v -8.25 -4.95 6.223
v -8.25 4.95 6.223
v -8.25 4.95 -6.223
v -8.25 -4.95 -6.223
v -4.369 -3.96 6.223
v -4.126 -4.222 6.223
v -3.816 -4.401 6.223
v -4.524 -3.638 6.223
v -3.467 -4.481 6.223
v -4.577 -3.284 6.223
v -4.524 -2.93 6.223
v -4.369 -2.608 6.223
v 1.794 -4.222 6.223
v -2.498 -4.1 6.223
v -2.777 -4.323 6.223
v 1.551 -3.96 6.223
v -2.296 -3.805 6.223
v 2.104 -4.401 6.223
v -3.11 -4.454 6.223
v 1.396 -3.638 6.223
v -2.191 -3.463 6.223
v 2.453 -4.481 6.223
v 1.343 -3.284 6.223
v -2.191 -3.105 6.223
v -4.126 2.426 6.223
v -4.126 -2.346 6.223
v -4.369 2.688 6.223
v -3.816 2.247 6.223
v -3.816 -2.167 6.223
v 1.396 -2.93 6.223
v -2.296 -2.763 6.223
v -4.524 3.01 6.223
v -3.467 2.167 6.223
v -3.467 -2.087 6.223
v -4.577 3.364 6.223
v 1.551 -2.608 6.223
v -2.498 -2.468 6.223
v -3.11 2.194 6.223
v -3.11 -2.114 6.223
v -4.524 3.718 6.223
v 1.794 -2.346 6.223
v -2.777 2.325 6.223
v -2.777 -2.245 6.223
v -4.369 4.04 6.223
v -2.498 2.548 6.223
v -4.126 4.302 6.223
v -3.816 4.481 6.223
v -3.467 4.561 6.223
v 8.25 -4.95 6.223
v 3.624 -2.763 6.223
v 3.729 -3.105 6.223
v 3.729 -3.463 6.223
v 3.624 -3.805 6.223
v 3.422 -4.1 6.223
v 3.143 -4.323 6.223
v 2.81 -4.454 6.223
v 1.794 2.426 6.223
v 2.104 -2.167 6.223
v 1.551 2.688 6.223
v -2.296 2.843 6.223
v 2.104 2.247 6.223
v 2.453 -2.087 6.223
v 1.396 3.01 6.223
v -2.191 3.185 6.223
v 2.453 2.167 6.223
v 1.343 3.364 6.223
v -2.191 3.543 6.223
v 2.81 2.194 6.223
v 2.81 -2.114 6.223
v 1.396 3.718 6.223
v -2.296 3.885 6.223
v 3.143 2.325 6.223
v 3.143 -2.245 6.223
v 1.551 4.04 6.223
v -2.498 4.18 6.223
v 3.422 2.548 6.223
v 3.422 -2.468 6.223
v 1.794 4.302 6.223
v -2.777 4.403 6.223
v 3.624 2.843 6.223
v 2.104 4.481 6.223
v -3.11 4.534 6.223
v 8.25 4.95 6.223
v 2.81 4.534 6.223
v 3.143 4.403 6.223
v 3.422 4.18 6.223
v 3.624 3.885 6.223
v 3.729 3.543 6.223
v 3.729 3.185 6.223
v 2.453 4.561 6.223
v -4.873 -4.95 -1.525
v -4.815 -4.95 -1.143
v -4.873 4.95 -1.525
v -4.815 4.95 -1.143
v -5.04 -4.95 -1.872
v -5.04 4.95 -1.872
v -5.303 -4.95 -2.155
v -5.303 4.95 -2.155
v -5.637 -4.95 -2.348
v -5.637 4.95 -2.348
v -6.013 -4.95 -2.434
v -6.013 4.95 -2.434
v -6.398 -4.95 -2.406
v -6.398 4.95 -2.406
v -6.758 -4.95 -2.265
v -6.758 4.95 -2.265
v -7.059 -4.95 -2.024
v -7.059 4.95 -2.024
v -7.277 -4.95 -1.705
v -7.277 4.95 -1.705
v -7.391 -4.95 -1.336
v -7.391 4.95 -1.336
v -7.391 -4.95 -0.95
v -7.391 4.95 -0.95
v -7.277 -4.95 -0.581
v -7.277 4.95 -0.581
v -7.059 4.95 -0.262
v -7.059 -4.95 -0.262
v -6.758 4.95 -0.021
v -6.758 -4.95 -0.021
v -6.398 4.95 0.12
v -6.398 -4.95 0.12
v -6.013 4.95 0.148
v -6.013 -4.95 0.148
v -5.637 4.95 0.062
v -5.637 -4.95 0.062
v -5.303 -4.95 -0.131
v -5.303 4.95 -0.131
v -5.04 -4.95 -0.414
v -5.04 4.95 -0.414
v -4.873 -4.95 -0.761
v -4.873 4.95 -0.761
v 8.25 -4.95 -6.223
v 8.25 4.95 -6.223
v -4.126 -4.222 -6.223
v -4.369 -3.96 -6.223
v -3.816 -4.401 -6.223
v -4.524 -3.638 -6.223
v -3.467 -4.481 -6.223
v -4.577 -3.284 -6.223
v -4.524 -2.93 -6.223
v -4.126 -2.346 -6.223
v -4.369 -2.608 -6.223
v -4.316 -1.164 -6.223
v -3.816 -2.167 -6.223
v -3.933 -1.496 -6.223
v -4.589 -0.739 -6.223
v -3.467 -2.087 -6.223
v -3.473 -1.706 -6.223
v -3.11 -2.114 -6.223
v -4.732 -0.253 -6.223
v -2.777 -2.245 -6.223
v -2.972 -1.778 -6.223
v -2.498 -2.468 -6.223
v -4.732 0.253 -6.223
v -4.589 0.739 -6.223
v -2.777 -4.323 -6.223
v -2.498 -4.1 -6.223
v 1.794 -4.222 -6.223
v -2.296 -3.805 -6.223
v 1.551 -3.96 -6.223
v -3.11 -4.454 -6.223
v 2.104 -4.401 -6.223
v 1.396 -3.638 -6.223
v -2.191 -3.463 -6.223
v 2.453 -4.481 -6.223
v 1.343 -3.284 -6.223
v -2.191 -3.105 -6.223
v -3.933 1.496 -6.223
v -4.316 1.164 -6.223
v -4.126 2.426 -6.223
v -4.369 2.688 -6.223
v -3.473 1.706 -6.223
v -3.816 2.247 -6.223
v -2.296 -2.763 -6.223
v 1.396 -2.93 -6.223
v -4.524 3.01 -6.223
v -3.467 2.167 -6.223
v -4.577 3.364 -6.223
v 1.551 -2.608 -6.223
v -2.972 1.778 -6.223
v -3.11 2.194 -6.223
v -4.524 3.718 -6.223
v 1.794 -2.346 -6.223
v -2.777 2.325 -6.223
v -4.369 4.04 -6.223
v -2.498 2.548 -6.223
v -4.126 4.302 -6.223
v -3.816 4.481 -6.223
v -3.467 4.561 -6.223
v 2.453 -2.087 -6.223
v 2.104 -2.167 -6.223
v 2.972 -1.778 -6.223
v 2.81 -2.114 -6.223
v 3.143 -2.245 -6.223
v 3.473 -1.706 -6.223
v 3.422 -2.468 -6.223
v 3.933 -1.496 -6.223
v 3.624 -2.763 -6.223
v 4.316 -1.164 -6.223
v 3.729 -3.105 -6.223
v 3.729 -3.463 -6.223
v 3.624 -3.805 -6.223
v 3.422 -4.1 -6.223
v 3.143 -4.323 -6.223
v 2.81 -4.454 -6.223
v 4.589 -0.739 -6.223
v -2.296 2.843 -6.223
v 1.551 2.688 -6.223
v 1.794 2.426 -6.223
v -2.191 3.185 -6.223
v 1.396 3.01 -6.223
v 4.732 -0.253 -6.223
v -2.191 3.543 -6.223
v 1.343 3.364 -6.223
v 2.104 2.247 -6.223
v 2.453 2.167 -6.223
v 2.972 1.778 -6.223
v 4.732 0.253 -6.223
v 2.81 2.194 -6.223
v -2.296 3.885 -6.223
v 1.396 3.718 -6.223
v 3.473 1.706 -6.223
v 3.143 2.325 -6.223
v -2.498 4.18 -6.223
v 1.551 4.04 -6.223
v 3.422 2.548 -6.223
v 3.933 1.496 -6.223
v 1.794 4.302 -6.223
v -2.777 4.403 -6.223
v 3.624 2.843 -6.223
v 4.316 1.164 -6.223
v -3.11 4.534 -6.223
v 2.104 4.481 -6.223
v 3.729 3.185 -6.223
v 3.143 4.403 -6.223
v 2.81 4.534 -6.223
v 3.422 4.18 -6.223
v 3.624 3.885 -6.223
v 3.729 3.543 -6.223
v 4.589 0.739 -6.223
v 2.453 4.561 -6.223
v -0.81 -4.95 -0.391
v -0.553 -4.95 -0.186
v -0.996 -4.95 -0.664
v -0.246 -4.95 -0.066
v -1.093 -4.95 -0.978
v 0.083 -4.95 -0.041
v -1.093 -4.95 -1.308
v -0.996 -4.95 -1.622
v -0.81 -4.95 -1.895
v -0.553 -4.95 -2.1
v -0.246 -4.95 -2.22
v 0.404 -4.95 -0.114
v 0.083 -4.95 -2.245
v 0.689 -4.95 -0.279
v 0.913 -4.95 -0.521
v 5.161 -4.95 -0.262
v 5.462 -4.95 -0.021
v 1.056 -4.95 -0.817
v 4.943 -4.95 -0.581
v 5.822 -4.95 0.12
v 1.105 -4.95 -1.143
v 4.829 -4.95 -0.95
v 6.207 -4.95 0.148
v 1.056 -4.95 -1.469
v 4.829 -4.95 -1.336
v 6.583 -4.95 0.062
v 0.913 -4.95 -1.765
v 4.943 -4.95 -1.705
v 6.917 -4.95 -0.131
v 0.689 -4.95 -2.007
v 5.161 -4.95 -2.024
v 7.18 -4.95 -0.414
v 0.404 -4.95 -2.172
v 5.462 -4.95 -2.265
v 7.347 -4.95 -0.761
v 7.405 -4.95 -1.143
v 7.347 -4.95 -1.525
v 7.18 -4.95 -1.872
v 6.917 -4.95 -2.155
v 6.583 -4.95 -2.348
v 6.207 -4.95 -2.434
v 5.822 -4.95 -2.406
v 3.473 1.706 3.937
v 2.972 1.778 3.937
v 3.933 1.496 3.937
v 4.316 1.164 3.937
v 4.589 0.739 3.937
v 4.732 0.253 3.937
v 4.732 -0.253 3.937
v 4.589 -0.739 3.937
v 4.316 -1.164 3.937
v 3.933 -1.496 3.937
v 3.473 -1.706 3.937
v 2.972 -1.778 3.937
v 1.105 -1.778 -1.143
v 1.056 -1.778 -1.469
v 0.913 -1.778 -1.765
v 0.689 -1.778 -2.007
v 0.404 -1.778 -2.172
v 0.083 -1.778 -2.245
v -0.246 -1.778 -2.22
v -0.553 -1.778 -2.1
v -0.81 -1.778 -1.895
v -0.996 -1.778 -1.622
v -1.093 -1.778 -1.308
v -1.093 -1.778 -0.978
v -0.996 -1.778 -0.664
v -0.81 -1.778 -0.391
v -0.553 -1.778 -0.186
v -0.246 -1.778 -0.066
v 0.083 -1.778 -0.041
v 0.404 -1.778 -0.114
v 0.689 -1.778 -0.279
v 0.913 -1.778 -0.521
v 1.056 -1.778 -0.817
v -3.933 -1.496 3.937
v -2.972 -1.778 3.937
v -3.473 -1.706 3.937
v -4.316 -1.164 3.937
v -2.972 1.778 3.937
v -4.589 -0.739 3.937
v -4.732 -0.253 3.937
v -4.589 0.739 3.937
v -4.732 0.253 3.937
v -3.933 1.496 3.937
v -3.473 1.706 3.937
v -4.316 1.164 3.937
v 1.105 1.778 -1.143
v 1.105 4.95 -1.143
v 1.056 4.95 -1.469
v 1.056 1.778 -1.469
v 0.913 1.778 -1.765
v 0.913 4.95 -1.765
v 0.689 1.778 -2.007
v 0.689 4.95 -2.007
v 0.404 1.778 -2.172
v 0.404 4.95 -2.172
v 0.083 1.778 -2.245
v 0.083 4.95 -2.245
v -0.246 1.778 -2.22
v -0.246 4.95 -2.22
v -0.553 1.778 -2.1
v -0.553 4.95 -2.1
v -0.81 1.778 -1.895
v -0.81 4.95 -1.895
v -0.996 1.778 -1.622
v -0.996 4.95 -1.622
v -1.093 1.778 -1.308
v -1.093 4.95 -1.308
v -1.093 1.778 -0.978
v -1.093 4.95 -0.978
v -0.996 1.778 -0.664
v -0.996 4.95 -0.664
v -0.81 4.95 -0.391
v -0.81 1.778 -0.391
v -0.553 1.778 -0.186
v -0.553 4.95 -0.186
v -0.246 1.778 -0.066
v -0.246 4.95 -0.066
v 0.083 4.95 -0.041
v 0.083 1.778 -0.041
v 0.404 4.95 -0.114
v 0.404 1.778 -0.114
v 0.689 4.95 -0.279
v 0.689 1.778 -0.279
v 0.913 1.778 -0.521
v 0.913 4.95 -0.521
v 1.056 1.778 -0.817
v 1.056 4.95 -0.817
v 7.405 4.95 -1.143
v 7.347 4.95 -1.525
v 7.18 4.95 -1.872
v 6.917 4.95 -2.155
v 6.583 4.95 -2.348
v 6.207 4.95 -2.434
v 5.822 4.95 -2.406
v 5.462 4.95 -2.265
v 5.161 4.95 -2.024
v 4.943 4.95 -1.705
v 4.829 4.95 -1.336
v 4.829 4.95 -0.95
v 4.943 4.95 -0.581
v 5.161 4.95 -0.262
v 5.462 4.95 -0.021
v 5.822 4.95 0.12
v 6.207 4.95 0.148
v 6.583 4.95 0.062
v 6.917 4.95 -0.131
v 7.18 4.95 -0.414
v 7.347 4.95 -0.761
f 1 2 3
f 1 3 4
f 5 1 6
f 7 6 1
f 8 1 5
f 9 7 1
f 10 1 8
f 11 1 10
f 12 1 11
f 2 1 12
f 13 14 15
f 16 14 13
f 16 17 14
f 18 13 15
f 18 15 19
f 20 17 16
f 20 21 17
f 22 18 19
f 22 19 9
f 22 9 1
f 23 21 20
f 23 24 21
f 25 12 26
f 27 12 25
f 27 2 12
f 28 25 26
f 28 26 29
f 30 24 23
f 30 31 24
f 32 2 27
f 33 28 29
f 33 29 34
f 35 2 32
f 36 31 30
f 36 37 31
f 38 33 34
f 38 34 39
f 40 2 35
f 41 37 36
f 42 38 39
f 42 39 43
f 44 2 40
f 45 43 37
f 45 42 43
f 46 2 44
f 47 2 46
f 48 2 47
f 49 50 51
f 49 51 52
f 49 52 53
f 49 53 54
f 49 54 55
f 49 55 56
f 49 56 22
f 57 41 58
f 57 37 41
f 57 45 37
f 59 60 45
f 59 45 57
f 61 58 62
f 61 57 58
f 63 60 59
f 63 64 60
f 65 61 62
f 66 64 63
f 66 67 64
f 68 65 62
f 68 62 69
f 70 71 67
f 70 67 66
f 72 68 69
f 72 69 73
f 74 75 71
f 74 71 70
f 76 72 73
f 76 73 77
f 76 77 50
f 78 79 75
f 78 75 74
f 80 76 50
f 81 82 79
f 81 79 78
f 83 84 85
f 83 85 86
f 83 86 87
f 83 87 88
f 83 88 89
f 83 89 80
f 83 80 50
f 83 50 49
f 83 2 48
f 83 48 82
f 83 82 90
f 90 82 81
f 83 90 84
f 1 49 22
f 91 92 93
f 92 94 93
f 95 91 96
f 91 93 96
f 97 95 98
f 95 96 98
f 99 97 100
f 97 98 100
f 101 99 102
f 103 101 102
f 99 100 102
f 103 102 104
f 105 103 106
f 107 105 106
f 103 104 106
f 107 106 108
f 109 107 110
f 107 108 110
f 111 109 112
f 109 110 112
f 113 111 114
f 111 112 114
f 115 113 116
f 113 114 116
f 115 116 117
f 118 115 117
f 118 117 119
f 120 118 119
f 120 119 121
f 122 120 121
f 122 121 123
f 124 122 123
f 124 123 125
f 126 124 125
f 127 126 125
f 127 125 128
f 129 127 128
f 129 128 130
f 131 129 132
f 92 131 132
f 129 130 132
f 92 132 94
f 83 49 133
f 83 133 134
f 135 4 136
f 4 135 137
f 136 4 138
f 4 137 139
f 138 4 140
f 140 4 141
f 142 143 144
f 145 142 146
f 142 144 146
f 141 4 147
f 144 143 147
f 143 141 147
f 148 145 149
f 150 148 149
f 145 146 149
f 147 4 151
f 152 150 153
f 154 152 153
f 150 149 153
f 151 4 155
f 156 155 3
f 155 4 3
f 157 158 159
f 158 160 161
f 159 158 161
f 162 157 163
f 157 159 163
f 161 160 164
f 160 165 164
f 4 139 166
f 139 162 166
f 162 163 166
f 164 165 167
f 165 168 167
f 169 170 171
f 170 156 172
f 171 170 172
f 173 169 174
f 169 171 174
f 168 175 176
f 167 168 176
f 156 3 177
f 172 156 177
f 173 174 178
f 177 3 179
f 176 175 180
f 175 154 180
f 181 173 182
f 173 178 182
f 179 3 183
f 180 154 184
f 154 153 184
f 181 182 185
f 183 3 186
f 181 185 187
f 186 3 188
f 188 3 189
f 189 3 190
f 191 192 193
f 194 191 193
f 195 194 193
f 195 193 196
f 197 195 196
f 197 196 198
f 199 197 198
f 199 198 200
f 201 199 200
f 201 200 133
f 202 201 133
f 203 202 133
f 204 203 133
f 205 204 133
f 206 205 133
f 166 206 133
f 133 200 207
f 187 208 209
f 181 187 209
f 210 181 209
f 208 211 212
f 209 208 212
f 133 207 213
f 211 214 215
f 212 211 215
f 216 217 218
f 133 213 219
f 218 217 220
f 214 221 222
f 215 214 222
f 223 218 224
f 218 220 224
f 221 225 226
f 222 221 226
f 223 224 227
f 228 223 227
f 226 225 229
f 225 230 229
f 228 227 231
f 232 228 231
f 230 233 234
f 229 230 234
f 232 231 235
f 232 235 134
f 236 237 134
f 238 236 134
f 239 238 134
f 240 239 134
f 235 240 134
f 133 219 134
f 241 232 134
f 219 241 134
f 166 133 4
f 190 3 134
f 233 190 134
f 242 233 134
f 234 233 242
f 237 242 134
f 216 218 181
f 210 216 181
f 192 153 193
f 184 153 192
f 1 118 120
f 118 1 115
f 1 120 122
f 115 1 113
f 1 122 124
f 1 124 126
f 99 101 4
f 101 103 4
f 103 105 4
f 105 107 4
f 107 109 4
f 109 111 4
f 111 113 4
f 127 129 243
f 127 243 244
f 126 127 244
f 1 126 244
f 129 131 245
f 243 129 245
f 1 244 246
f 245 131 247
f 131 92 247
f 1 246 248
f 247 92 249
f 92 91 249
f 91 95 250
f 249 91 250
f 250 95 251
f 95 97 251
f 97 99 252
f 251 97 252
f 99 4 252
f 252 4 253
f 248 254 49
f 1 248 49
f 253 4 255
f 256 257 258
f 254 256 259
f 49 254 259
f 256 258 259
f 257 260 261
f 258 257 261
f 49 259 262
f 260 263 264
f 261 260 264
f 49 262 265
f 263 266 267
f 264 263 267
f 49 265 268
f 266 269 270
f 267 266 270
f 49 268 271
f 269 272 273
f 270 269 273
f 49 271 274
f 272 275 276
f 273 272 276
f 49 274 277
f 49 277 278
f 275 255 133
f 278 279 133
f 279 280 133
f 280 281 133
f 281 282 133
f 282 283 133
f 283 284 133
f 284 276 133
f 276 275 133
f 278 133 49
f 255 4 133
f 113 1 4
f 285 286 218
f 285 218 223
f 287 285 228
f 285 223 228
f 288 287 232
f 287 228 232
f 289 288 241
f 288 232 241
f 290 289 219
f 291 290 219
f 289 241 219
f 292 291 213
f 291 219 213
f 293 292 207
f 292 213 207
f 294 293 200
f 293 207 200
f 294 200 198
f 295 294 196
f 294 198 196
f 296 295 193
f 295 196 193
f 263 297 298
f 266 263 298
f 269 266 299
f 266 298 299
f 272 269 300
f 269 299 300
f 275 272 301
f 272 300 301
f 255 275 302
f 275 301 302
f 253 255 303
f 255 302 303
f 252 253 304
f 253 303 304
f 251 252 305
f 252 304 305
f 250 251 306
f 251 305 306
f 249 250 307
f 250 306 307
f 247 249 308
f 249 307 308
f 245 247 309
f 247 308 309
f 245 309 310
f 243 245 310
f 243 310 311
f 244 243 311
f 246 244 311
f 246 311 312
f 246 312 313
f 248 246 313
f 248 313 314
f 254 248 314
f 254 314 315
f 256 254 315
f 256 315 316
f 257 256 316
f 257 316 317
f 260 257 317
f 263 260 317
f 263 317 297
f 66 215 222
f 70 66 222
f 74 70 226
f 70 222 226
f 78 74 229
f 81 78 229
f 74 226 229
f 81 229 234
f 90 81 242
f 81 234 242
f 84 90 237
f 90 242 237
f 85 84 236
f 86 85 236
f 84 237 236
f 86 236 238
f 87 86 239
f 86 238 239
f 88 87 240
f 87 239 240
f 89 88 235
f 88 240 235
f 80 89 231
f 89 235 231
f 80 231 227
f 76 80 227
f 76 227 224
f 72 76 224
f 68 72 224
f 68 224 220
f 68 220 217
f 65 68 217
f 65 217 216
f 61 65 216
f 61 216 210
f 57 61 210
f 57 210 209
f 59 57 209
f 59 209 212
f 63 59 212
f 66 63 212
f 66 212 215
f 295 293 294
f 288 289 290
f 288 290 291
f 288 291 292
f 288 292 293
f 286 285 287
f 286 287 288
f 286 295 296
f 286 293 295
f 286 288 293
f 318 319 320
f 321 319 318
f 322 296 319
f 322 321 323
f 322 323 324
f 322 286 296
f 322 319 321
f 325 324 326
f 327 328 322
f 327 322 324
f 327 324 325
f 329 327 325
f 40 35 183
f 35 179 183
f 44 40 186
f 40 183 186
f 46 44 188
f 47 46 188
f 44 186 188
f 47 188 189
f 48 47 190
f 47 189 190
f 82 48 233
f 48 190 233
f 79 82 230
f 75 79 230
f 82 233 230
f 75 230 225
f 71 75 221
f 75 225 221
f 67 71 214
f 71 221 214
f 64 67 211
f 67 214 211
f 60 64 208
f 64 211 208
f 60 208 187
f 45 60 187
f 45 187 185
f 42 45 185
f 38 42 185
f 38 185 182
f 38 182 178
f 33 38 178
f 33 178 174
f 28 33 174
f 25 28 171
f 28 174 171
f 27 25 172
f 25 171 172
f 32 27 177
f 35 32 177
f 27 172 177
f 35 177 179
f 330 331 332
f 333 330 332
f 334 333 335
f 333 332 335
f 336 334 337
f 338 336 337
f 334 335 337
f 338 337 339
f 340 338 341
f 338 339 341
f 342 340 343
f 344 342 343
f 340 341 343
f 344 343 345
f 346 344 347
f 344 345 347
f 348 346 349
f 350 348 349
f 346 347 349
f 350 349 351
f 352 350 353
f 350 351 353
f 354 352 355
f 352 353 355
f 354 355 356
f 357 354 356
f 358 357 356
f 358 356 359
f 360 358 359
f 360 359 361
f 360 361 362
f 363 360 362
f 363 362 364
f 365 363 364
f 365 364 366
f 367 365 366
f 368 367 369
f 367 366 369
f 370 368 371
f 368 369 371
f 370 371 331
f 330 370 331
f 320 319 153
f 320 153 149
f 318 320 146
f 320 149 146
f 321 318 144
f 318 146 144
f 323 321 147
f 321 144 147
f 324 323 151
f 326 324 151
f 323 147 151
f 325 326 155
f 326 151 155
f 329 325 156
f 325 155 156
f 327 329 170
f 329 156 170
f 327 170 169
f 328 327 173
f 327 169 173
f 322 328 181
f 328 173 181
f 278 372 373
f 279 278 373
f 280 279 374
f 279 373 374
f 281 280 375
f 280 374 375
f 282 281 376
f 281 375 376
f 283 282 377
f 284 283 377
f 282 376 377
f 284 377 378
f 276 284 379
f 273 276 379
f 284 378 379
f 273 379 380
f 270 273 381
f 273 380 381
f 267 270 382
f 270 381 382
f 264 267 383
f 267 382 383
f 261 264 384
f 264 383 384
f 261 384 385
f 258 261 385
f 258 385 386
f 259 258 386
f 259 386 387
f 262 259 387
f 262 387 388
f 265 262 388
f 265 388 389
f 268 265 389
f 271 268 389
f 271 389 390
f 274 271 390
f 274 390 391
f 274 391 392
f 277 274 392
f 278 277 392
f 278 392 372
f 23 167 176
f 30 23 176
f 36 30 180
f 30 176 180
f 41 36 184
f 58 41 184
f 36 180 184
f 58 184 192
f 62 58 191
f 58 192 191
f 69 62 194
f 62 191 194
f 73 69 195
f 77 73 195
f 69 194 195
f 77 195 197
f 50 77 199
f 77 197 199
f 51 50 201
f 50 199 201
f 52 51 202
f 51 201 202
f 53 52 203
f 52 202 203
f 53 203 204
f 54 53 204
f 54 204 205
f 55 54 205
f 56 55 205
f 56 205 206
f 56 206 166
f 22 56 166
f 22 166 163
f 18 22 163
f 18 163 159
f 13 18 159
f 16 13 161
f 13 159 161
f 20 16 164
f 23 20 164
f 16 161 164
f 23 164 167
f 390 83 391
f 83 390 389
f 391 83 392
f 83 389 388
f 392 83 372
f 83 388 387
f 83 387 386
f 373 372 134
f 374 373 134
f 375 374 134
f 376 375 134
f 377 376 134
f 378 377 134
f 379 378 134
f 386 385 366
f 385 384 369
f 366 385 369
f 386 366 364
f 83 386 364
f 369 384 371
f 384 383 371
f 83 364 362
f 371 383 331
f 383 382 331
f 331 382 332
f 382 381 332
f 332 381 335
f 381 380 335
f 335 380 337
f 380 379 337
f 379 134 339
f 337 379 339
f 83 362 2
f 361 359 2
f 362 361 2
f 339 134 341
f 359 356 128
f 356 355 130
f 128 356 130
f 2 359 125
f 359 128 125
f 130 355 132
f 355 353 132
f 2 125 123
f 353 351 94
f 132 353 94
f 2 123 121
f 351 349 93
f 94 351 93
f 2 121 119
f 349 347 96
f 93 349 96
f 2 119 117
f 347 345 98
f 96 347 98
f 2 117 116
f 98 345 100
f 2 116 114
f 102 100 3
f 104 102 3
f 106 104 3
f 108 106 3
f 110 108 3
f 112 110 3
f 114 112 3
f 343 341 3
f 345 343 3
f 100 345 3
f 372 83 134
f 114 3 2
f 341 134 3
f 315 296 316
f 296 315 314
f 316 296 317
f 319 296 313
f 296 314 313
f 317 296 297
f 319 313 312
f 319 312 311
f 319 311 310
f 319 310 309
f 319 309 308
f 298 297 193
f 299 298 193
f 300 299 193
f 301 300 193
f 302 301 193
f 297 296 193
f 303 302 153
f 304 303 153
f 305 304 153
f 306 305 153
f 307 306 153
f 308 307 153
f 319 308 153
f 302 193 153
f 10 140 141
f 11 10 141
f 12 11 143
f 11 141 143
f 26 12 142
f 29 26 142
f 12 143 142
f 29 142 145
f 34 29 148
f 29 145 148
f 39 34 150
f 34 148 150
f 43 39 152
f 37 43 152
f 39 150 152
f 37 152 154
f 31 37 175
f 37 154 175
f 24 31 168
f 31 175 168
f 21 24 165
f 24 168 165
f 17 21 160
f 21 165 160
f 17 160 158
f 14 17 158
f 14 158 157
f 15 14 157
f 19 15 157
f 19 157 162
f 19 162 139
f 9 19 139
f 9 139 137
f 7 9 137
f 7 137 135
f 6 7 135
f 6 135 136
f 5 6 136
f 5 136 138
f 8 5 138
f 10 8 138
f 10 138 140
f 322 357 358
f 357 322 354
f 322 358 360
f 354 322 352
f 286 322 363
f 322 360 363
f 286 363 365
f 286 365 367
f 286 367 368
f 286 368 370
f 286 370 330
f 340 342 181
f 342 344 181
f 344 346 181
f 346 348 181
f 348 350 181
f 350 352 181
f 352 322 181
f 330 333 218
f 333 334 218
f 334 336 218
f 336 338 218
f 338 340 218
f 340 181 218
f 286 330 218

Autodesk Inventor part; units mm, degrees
ref_plane "YZ Plane" through (0, 0, 0) normal (1, 0, 0) x (0, 1, 0)
ref_plane "XZ Plane" through (0, 0, 0) normal (0, 1, 0) x (-1, 0, 0)
ref_plane "XY Plane" through (0, 0, 0) normal (0, 0, 1) x (1, 0, 0)
sketch "Sketch1" plane through (0, 0, 0) normal (0, 0, 1) x (1, 0, 0)
  line L0 (8.25, 4.95) -> (-8.25, 4.95)
  line L1 (-8.25, 4.95) -> (-8.25, -4.95)
  line L2 (-8.25, -4.95) -> (8.25, -4.95)
  line L3 (8.25, -4.95) -> (8.25, 4.95)
  point P0 (0, 0)
  dimension "d19" = 9.9
extrude "Box" add sketch "Sketch1" along normal mid plane 12.446
sketch "Sketch3" plane through (0, 0, -6.223) normal (0, 0, -1) x (-1, 0, 0)
  line L0 (-5.08, 0) -> (5.08, 0) construction
  line L1 (-4.75, 0) -> (4.75, 0) construction
  line L2 (-2.972, -1.778) -> (2.972, -1.778)
  line L3 (2.972, 1.778) -> (-2.972, 1.778)
  arc A0 (-2.972, 1.778) -> (-2.972, -1.778) centre (-2.972, 0) ccw
  arc A1 (2.972, -1.778) -> (2.972, 1.778) centre (2.972, 0) ccw
  point P0 (0, 0)
  point P1 (0, 0)
  point P2 (0, 0)
  dimension "d31" = 9.5
extrude "Slot" cut sketch "Sketch3" against normal blind 10.16
sketch "Sketch4" plane through (0, 0, -6.223) normal (0, 0, -1) x (-1, 0, 0)
  circle A0 centre (-2.5426, 3.364) radius 1.2
  line L0 (-2.972, 1.778) -> (2.972, 1.778) projected
  line L1 (8.25, 4.95) -> (-8.25, 4.95) projected
  point P0 (0, 0)
  dimension "d32" = 2.4
  dimension "d33" = 3.172
  dimension "d34" = 1.586
extrude "MountingHole" cut sketch "Sketch4" against normal blind 12.5
pattern_linear "Mounting Holes" count 2 spacing 5.92 along (-1, 0, 0) count 2 spacing 6.648 along (0, -1, 0) of "MountingHole"
sketch "Sketch6" plane through (-8.25, 4.95, 6.223) normal (0, 1, 0) x (1, 0, 0)
  circle A0 centre (8.25, 7.366) radius 1.105
  point P0 (8.25, 6.223)
  dimension "d20" = 2.21
extrude "CentralSMAHole" cut sketch "Sketch6" against normal blind 10
sketch "Sketch8" plane through (-8.25, 4.95, 6.223) normal (0, 1, 0) x (1, 0, 0)
  circle A0 centre (14.36, 7.366) radius 1.295
  point P0 (8.25, 6.223)
  dimension "d23" = 2.59
extrude "SMAMounting" cut sketch "Sketch8" against normal blind 10
pattern_linear "SMAMountingHoles" count 2 spacing 12.22 along (-1, 0, 0) of "SMAMounting"
equation "\"d34\" = 0.5 * d33"
properties part number "NewSink"
